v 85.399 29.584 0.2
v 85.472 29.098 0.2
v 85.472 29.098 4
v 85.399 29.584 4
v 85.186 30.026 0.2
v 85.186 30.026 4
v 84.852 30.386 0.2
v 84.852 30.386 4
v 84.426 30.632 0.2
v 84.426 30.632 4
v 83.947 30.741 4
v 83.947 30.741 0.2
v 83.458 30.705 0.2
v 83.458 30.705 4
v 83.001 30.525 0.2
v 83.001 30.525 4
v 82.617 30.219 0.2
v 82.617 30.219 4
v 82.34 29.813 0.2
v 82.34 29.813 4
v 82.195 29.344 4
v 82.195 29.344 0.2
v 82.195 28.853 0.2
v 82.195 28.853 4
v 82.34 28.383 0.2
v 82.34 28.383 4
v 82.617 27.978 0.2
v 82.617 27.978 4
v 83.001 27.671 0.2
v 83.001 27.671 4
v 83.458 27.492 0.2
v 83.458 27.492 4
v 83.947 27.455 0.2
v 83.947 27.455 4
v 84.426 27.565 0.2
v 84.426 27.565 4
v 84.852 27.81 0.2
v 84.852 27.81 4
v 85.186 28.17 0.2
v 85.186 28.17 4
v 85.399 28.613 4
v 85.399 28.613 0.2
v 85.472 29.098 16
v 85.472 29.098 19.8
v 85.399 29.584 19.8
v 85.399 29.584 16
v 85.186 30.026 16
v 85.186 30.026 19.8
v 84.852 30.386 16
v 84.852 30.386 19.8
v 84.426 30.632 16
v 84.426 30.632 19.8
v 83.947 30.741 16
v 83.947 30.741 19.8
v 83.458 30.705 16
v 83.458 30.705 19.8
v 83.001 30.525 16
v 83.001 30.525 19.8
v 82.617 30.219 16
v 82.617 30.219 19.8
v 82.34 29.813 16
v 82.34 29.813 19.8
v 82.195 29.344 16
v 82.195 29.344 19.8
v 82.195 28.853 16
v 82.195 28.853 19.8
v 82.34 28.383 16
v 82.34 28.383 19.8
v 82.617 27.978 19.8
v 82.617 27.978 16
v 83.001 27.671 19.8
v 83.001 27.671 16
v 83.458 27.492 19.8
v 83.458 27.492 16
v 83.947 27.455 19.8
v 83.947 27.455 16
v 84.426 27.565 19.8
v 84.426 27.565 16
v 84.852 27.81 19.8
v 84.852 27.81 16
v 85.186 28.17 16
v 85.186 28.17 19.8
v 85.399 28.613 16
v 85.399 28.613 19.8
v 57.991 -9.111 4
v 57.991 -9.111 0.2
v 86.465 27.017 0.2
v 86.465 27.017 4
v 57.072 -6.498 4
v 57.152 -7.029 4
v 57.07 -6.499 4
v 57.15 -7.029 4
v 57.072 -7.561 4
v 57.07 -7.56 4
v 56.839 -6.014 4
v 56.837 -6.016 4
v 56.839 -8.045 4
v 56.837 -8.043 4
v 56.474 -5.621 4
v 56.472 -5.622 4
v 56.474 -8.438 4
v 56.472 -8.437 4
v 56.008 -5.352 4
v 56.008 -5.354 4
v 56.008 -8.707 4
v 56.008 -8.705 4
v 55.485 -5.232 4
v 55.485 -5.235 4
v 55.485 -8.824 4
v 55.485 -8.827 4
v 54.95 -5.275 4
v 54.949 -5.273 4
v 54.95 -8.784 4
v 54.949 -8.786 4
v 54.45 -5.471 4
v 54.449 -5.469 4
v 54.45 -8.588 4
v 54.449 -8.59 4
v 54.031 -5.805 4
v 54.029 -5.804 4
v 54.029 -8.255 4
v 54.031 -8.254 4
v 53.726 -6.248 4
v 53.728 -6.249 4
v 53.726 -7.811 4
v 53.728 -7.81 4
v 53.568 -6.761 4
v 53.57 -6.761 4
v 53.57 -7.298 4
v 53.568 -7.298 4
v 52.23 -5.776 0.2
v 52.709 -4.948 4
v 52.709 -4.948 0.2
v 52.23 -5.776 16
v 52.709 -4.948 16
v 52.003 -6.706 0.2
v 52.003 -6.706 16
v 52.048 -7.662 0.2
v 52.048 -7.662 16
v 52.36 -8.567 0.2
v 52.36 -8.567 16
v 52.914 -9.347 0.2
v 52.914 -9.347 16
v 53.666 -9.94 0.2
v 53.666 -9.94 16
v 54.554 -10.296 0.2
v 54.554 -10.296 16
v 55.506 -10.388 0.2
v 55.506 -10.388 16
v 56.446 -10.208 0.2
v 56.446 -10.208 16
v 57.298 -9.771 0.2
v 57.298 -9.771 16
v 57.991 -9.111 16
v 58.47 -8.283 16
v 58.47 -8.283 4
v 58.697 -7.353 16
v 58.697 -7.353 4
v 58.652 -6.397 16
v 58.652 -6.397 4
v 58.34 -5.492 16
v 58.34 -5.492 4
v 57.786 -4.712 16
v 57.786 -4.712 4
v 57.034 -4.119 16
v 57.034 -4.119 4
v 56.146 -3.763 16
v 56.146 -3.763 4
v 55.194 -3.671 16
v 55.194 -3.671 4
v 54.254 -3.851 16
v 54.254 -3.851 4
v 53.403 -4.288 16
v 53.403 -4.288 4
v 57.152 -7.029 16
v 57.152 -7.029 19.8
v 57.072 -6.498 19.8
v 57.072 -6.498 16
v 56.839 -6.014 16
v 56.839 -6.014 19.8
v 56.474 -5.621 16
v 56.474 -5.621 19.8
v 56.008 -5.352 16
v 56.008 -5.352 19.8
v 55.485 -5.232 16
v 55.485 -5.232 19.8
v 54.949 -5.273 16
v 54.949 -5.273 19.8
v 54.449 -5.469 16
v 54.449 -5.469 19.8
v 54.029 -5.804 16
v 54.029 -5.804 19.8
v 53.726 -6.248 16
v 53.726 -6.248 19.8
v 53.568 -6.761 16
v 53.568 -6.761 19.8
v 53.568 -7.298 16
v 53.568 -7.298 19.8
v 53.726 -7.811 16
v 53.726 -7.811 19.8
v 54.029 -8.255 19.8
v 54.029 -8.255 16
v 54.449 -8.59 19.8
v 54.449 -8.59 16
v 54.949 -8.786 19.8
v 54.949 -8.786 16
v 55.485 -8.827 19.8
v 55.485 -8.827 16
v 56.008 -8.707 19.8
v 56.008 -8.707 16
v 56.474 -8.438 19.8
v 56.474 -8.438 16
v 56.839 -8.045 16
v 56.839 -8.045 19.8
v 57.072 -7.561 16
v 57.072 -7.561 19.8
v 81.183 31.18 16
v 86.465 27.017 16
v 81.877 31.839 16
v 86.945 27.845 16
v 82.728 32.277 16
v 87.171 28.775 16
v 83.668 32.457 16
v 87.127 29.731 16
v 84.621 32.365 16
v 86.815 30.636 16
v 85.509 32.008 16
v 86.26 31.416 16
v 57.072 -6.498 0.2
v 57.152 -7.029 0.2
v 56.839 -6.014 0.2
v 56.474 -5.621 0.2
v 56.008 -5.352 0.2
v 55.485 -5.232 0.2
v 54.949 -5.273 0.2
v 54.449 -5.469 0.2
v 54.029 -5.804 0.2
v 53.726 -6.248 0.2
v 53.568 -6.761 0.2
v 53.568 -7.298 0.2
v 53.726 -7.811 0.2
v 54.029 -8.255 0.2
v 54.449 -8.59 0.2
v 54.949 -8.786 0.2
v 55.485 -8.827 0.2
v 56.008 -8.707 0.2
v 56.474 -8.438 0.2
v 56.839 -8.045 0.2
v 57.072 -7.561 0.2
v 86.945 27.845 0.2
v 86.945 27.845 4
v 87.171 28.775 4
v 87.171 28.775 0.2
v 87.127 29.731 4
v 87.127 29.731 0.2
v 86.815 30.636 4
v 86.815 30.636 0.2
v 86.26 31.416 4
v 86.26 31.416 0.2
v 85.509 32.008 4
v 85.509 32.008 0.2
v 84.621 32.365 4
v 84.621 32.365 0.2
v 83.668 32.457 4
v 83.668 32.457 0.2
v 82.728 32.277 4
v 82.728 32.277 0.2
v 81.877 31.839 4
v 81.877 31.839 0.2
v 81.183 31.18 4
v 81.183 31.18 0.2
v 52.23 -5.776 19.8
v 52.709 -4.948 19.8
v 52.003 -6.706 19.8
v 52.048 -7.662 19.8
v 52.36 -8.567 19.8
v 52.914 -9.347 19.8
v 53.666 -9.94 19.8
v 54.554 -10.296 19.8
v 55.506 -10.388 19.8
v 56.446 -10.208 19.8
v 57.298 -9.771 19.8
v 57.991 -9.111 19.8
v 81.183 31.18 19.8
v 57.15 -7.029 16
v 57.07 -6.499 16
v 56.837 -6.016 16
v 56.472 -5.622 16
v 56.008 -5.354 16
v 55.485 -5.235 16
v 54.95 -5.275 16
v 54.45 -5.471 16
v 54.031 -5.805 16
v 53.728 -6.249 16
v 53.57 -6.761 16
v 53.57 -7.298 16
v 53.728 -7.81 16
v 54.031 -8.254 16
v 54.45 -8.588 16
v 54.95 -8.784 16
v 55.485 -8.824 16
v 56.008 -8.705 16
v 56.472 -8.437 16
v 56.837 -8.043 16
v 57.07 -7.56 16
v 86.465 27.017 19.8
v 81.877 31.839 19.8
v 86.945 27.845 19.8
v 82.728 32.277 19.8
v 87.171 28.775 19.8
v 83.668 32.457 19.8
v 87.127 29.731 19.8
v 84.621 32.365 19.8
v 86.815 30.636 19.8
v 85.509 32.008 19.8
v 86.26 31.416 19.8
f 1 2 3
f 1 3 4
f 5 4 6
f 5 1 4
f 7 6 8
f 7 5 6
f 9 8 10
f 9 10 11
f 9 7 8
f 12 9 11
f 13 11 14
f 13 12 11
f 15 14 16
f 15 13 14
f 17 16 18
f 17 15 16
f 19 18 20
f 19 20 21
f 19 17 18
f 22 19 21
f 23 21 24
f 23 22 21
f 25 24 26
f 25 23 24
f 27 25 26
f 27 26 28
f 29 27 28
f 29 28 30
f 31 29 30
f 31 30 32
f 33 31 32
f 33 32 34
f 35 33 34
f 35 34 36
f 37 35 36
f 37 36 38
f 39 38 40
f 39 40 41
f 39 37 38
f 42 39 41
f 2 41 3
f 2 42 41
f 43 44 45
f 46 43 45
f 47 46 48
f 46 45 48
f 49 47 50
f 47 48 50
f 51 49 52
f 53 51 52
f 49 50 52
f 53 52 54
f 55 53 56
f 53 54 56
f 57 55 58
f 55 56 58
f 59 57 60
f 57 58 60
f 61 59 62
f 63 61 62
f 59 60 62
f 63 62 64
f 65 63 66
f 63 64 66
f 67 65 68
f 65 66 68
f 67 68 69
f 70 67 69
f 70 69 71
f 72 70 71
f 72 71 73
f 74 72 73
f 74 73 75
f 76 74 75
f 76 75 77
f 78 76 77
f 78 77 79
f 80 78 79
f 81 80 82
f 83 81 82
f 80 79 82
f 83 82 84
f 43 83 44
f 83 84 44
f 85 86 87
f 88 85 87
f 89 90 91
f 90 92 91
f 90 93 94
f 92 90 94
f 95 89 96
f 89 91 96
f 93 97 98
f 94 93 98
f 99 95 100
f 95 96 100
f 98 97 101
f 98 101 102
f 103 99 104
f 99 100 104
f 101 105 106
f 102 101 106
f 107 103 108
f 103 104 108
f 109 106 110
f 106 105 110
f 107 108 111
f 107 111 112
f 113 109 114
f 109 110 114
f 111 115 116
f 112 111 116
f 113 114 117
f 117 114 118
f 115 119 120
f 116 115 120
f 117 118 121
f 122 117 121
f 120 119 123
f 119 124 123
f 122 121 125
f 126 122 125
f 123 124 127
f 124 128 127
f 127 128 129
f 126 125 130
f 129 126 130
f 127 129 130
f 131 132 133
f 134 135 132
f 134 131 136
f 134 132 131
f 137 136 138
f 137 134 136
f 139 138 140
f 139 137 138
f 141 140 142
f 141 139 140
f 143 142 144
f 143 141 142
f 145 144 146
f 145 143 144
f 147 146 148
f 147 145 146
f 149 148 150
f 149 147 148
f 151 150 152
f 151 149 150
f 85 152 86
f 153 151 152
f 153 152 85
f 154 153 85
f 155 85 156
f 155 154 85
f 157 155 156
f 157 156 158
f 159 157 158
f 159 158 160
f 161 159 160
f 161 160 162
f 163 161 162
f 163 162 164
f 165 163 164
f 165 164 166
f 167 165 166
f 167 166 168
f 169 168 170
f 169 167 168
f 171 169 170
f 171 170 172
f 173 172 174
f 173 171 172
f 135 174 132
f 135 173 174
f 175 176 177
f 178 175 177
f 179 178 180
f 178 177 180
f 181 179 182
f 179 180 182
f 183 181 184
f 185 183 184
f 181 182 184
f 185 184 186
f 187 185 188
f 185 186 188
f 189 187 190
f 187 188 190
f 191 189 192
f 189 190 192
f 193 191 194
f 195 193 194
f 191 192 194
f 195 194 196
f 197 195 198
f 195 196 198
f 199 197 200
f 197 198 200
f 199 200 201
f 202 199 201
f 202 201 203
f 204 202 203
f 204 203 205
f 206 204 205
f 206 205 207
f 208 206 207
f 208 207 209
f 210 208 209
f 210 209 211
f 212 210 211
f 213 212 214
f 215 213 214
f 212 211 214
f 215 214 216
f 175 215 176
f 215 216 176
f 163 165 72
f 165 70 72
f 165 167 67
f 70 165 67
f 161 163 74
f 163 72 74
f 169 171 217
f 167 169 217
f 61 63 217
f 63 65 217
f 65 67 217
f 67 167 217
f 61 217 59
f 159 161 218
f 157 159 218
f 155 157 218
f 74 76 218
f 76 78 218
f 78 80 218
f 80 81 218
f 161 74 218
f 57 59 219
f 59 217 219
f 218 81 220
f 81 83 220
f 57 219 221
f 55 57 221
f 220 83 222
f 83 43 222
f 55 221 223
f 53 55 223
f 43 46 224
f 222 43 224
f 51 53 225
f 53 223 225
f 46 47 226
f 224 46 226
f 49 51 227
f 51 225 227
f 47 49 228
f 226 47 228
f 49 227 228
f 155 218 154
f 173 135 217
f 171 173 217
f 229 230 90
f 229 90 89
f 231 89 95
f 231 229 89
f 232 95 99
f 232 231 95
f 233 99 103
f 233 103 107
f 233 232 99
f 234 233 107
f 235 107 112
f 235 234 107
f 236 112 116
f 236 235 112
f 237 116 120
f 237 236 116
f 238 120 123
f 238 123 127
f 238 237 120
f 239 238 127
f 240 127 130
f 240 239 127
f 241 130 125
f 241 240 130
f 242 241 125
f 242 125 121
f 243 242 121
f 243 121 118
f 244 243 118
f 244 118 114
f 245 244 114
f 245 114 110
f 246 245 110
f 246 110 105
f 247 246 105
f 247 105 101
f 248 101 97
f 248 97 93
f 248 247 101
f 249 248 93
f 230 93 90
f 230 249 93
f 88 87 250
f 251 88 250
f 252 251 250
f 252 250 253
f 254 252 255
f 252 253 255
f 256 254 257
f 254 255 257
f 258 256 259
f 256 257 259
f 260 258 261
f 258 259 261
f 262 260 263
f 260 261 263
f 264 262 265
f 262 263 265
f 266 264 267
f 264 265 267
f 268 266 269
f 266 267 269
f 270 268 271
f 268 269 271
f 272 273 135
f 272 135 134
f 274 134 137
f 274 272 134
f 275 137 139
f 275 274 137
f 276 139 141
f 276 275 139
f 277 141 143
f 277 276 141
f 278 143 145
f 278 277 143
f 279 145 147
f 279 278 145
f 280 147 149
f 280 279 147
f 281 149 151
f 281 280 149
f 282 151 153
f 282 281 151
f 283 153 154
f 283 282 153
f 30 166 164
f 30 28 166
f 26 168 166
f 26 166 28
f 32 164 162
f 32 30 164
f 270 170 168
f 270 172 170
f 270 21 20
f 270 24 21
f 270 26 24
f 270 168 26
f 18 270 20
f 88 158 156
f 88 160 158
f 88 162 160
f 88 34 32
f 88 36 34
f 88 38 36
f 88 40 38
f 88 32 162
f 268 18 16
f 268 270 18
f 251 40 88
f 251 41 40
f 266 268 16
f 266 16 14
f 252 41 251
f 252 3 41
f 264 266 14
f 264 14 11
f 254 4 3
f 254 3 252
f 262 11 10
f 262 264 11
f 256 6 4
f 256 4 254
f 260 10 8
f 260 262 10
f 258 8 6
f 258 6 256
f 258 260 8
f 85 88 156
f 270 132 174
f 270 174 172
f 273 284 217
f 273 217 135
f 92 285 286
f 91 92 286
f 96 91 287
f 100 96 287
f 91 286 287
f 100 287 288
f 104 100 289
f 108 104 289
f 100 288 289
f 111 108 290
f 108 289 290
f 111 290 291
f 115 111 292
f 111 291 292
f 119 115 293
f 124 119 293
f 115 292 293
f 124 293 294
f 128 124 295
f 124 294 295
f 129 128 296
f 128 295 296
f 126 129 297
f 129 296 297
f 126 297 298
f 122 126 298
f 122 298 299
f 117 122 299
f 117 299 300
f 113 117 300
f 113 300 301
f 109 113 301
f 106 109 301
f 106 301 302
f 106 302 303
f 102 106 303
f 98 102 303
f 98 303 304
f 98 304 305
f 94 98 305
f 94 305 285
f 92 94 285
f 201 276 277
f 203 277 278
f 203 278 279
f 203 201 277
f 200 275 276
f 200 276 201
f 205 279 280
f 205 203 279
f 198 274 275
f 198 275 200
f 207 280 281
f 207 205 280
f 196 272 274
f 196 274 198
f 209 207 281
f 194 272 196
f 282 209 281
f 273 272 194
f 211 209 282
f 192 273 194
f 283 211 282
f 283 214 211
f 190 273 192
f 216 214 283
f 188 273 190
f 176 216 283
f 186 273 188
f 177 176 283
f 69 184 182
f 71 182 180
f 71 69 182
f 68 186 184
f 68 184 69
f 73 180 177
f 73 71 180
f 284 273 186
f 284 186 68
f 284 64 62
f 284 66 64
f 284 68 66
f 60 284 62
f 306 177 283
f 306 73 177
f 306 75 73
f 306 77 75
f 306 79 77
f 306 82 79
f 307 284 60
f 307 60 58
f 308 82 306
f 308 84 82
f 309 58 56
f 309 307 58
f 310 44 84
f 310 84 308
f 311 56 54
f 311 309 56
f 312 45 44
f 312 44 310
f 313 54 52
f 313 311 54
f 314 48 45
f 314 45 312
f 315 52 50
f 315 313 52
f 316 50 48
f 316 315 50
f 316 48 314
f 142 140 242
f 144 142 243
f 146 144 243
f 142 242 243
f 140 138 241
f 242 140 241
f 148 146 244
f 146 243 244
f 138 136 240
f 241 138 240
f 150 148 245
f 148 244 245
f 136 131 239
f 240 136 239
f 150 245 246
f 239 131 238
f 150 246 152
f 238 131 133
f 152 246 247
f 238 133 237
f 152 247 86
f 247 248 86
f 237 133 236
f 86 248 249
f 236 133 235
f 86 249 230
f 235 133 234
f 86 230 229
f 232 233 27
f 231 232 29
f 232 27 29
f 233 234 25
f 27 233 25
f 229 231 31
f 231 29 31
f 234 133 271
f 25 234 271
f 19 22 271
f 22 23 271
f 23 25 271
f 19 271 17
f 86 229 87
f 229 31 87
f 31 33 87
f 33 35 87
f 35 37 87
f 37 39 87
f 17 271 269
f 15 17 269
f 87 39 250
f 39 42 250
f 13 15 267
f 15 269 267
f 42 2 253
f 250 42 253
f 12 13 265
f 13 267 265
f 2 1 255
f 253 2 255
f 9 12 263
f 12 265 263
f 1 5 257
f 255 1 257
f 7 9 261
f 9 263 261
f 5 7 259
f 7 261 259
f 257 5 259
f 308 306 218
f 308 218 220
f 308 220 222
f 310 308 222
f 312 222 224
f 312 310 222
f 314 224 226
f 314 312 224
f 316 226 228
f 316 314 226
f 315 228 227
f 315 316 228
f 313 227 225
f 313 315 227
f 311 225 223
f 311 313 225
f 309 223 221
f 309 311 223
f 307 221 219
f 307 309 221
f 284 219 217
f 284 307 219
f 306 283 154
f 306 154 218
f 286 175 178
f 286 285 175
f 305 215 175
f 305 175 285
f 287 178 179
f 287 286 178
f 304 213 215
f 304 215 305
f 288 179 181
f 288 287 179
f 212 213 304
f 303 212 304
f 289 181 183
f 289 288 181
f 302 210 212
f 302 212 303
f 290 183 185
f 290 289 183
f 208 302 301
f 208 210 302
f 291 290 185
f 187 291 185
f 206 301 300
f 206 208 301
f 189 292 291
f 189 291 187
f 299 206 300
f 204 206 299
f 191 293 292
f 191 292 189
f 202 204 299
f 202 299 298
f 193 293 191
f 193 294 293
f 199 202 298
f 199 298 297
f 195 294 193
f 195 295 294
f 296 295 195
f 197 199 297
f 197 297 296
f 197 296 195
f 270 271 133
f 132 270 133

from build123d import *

# Parameters (mm, degrees)
SALIENTE_EXTRUIR1_START       = 0.2
SALIENTE_EXTRUIR1_OUTLINE_R   = 1.802094284
SALIENTE_EXTRUIR1_OUTLINE_R_2 = 1.64762906
SALIENTE_EXTRUIR1_DEPTH       = 3.8
CROQUIS2_R                    = 3.36248758
CROQUIS2_R_2                  = 1.8
SALIENTE_EXTRUIR2_DEPTH       = 6
SIMETR_A5_COPY_1_SKETCH_R     = 3.36248758
SIMETR_A5_COPY_1_SKETCH_R_2   = 1.8
SIMETR_A5_COPY_1_DEPTH        = 6
SIMETR_A5_COPY_2_SKETCH_R     = 3.36248758
SIMETR_A5_COPY_2_SKETCH_R_2   = 1.8
SIMETR_A5_COPY_2_DEPTH        = 6


# Read off the part's stored shape, not the designer's step: Saliente-Extruir1
with BuildPart() as part:
    # Saliente-Extruir1 outline → Saliente-Extruir1 (new body)
    with BuildSketch(Plane.XY.offset(SALIENTE_EXTRUIR1_START)):
        with BuildLine():
            Line((57.990889124, -9.110899758), (86.465185089, 27.016852307))
            ThreePointArc((86.465185089, 27.016852307), (85.905736152, 31.739104142), (81.183484317, 31.179655205))
            Line((81.183484317, 31.179655205), (52.709188351, -4.94809686))
            ThreePointArc((52.709188351, -4.94809686), (53.268637289, -9.670348695), (57.990889124, -9.110899758))
        make_face()
        with Locations((55.350038738, -7.029498309)):
            Circle(SALIENTE_EXTRUIR1_OUTLINE_R, mode=Mode.SUBTRACT)
        with Locations((83.824334703, 29.098253756)):
            Circle(SALIENTE_EXTRUIR1_OUTLINE_R_2, mode=Mode.SUBTRACT)
    saliente_extruir1 = extrude(amount=SALIENTE_EXTRUIR1_DEPTH)

    # Croquis2 → Saliente-Extruir2 (add)
    with BuildSketch(Plane.XY.offset(4)):
        with Locations(Location((55.350038738, -7.029498309, 0), (0, 0, 141.756384729))):
            Circle(CROQUIS2_R)
        with Locations((55.350038738, -7.029498309)):
            Circle(CROQUIS2_R_2, mode=Mode.SUBTRACT)
    saliente_extruir2 = extrude(amount=SALIENTE_EXTRUIR2_DEPTH)

    # Simetría4: Saliente-Extruir2 across plane
    add(saliente_extruir2.mirror(Plane.XY.offset(10)))

    # Simetría5: Saliente-Extruir1 across plane
    add(saliente_extruir1.mirror(Plane.XY.offset(10)))

    # Simetría5 copy 1 sketch → Simetría5 copy 1 (add)
    with BuildSketch(Plane.XY.offset(4)):
        with Locations(Location((55.350038738, -7.029498309, 0), (0, 0, 141.756384729))):
            Circle(SIMETR_A5_COPY_1_SKETCH_R)
        with Locations((55.350038738, -7.029498309)):
            Circle(SIMETR_A5_COPY_1_SKETCH_R_2, mode=Mode.SUBTRACT)
    extrude(amount=SIMETR_A5_COPY_1_DEPTH)

    # Simetría5 copy 2 sketch → Simetría5 copy 2 (add)
    with BuildSketch(Plane(origin=(0, 0, 16), x_dir=(1, 0, 0), z_dir=(0, 0, -1))):
        with Locations((55.350038738, 7.029498309)):
            Circle(SIMETR_A5_COPY_2_SKETCH_R)
        with Locations((55.350038738, 7.029498309)):
            Circle(SIMETR_A5_COPY_2_SKETCH_R_2, mode=Mode.SUBTRACT)
    extrude(amount=SIMETR_A5_COPY_2_DEPTH)


solid = part.part
